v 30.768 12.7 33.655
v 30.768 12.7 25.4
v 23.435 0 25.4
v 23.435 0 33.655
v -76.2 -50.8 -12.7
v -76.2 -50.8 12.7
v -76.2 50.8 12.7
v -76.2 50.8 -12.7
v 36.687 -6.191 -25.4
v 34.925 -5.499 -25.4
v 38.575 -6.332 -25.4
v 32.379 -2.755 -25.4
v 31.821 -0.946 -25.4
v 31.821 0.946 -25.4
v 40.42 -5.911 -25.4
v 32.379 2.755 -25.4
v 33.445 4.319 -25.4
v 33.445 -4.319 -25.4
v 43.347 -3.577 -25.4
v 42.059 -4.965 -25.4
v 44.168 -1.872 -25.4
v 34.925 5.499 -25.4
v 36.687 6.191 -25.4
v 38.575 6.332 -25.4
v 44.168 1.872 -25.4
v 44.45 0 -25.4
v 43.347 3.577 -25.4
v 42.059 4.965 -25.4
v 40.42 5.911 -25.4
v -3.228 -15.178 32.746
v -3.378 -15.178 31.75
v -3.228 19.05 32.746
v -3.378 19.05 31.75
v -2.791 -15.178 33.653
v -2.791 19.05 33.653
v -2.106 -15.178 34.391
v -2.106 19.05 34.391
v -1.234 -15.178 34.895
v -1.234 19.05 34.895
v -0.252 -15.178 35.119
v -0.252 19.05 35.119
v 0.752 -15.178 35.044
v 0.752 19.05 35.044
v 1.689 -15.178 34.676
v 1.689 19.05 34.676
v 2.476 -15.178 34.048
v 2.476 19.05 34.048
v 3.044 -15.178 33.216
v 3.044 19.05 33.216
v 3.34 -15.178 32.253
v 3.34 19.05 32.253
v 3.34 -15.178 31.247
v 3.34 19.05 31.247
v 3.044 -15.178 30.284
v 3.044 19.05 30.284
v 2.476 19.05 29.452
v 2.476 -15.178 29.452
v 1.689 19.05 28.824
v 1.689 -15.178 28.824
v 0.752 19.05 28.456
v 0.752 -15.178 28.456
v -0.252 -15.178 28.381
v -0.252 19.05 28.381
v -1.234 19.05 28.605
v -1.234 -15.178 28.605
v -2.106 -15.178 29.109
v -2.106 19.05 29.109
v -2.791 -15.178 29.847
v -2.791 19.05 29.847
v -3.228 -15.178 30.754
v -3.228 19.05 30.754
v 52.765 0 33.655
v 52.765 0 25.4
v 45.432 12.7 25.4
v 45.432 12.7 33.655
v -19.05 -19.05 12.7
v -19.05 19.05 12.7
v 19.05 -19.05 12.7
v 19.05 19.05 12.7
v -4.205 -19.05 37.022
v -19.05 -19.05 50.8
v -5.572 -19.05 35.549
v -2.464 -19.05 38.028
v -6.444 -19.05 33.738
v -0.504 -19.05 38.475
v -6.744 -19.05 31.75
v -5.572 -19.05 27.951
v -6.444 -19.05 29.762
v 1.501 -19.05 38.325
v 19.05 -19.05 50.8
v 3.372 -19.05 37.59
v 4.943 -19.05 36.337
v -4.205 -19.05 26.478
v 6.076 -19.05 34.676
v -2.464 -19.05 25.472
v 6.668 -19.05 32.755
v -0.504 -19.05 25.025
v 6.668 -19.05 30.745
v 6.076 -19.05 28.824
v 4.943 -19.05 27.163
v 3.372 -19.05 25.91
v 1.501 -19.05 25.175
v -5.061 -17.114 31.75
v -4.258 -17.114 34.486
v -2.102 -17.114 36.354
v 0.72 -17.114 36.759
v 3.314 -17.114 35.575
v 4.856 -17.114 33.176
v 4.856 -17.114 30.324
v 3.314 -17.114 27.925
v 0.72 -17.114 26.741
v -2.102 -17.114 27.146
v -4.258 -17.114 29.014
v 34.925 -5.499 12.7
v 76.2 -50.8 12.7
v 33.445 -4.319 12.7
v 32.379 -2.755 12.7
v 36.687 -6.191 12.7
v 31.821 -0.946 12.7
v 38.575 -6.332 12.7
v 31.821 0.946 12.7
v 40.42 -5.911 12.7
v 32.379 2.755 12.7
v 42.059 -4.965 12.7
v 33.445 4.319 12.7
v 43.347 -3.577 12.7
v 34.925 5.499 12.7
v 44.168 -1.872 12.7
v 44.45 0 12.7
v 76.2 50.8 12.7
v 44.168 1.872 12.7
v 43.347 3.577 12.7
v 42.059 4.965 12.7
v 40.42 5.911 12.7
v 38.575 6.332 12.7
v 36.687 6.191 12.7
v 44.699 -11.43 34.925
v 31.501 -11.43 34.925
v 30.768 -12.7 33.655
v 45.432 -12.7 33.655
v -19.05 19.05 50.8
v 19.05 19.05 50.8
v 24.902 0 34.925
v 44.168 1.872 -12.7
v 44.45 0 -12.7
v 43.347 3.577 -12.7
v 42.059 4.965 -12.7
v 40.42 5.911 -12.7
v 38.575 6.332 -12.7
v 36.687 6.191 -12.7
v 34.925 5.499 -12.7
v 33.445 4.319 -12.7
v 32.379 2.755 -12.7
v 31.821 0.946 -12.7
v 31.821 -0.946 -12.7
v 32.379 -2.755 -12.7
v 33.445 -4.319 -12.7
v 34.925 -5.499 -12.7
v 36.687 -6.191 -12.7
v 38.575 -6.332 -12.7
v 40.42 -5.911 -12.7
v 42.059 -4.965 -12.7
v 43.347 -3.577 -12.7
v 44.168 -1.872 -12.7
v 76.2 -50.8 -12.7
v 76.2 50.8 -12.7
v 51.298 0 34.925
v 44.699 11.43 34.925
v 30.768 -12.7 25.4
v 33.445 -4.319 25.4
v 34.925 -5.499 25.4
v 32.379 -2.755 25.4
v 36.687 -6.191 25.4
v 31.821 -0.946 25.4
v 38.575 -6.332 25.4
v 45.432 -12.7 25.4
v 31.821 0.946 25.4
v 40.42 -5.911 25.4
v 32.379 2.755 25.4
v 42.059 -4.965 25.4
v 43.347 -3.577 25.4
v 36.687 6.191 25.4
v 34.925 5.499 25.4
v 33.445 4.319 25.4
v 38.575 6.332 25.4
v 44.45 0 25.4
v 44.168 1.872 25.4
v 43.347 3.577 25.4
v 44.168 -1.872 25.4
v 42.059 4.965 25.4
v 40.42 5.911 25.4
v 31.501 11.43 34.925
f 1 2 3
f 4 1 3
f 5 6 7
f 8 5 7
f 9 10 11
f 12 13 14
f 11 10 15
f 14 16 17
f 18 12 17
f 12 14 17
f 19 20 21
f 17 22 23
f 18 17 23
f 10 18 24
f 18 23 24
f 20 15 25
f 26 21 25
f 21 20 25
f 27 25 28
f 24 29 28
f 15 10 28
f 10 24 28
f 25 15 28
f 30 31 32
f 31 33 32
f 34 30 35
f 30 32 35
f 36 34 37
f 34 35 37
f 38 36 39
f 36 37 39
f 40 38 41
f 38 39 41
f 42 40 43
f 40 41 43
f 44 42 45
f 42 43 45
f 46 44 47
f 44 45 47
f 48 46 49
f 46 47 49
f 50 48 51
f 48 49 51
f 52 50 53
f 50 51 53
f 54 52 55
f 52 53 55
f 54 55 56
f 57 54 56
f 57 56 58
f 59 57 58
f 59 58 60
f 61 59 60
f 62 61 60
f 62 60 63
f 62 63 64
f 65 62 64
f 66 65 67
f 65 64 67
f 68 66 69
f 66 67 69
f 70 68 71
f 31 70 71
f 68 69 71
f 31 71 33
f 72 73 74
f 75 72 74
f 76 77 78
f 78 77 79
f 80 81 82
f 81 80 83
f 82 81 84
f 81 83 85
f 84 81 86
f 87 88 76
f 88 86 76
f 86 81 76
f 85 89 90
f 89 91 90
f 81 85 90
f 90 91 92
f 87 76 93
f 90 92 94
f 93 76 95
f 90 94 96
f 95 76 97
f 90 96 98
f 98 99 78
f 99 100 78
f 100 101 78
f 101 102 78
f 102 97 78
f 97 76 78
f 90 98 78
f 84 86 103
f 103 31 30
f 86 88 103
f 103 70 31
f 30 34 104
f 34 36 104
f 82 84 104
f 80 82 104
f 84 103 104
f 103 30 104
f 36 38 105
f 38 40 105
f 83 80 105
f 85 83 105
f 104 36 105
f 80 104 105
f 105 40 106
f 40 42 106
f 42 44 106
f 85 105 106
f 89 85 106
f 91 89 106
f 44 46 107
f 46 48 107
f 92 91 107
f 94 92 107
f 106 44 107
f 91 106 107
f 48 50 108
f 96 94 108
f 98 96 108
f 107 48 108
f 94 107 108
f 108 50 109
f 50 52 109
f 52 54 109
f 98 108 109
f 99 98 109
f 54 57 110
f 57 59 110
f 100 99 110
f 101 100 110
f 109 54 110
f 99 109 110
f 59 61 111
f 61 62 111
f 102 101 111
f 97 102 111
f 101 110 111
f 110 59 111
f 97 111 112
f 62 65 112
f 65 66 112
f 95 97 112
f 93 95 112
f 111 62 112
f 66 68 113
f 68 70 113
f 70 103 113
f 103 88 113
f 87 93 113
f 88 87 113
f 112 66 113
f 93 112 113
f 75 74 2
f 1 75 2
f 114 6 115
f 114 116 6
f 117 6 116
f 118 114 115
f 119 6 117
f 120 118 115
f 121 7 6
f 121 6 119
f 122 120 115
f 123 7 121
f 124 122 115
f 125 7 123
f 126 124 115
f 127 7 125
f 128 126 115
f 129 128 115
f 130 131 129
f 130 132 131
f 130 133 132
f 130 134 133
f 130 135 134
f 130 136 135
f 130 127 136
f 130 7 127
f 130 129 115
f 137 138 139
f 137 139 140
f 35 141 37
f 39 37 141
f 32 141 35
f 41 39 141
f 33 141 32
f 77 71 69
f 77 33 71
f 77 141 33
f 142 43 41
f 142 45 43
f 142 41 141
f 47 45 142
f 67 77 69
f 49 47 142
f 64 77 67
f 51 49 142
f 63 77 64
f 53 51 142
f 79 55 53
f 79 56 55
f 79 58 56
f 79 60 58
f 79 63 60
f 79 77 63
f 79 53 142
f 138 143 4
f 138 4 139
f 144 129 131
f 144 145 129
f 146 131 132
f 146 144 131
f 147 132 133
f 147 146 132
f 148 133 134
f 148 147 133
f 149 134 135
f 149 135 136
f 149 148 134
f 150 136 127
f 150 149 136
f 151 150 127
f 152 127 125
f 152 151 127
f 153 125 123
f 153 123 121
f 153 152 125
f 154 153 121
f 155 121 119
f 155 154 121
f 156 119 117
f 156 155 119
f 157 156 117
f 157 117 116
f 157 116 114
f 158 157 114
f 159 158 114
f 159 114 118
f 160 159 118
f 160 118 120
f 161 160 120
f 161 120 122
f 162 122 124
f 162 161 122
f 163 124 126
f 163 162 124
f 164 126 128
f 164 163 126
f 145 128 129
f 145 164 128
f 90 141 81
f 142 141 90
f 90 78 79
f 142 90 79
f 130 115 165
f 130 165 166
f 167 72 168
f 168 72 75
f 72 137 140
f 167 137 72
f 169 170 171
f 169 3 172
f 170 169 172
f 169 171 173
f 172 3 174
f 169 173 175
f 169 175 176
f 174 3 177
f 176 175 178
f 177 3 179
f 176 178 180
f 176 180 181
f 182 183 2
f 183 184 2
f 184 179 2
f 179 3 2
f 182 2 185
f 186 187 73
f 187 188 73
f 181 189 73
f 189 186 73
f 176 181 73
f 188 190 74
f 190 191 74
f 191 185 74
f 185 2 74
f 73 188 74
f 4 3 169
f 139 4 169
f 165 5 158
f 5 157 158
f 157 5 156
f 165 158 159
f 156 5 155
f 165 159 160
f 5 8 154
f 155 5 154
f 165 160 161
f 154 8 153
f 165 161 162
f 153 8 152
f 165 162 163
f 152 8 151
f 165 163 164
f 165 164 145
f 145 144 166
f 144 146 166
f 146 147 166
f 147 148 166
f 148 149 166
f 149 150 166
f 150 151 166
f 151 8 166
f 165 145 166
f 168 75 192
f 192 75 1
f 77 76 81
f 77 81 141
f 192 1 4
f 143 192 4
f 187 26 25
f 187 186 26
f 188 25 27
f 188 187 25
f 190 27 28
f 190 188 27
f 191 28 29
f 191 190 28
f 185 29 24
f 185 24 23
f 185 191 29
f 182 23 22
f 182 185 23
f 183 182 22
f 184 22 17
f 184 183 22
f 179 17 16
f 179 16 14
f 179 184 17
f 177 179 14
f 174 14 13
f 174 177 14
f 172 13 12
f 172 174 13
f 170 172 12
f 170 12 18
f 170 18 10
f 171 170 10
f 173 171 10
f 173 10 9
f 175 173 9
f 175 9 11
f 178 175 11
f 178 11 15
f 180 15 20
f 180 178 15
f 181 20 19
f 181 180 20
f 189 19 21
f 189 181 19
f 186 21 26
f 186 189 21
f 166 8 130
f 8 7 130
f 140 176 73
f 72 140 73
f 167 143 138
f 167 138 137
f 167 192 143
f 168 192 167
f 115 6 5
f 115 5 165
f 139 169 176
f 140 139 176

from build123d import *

# Parameters (mm, degrees)
F0_W            = 152.4
F0_H            = 101.6
F0_R            = 6.35
F1_DEPTH        = 12.7
F2_W            = 38.1
F2_H            = 38.1
F3_DEPTH        = 38.1
F4_DEPTH        = 25.4
F7_DEPTH        = 9.525
F8_SIZE         = 1.27
F10_D           = 6.7564
F10_CSINK_D     = 13.4874
F10_CSINK_ANGLE = 82


with BuildPart() as f1:
    # F0 (on Top) → F1 (new body, symmetric)
    with BuildSketch(Plane.XY):
        Rectangle(F0_W, F0_H)
        Polygon((45.4323484187, 12.7), (52.7646968374, 0), (45.4323484187, -12.7), (30.7676515813, -12.7), (23.4353031626, 0), (30.7676515813, 12.7), align=None, mode=Mode.SUBTRACT)
        Polygon((45.4323484187, -12.7), (52.7646968374, 0), (45.4323484187, 12.7), (30.7676515813, 12.7), (23.4353031626, 0), (30.7676515813, -12.7), align=None)
        with Locations((38.1, 0)):
            Circle(F0_R, mode=Mode.SUBTRACT)
    extrude(amount=F1_DEPTH, both=True)


with BuildPart() as f3:
    # F2 (on face) → F3 (new body)
    with BuildSketch(Plane.XY.offset(12.7)):
        Rectangle(F2_W, F2_H)
    extrude(amount=F3_DEPTH)

    # F10 (through all)
    with Locations(Plane.XZ.offset(19.05)):
        with Locations((0, 31.75)):
            CounterSinkHole(F10_D / 2, F10_CSINK_D / 2, counter_sink_angle=F10_CSINK_ANGLE)


with BuildPart() as f4:
    # F0 (on Top) → F4 (new body, symmetric)
    with BuildSketch(Plane.XY):
        with Locations((38.1, 0)):
            Circle(F0_R)
    extrude(amount=F4_DEPTH, both=True)

    # F6 (on face) → F7 (join)
    with BuildSketch(Plane.XY.offset(25.4)):
        Polygon((30.7676515813, -12.7), (45.4323484187, -12.7), (52.7646968374, 0), (45.4323484187, 12.7), (30.7676515813, 12.7), (23.4353031626, 0), align=None)
    extrude(amount=F7_DEPTH)

    # F8
    f8_edges = [f4.edges().sort_by_distance(p)[0] for p in [
        (27.101477, -6.35, 34.925),
        (38.1, -12.7, 34.925),
        (49.098523, -6.35, 34.925),
        (49.098523, 6.35, 34.925),
        (38.1, 12.7, 34.925),
        (27.101477, 6.35, 34.925),
    ]]
    chamfer(f8_edges, length=F8_SIZE)


solid = Compound([f1.part, f3.part, f4.part])
